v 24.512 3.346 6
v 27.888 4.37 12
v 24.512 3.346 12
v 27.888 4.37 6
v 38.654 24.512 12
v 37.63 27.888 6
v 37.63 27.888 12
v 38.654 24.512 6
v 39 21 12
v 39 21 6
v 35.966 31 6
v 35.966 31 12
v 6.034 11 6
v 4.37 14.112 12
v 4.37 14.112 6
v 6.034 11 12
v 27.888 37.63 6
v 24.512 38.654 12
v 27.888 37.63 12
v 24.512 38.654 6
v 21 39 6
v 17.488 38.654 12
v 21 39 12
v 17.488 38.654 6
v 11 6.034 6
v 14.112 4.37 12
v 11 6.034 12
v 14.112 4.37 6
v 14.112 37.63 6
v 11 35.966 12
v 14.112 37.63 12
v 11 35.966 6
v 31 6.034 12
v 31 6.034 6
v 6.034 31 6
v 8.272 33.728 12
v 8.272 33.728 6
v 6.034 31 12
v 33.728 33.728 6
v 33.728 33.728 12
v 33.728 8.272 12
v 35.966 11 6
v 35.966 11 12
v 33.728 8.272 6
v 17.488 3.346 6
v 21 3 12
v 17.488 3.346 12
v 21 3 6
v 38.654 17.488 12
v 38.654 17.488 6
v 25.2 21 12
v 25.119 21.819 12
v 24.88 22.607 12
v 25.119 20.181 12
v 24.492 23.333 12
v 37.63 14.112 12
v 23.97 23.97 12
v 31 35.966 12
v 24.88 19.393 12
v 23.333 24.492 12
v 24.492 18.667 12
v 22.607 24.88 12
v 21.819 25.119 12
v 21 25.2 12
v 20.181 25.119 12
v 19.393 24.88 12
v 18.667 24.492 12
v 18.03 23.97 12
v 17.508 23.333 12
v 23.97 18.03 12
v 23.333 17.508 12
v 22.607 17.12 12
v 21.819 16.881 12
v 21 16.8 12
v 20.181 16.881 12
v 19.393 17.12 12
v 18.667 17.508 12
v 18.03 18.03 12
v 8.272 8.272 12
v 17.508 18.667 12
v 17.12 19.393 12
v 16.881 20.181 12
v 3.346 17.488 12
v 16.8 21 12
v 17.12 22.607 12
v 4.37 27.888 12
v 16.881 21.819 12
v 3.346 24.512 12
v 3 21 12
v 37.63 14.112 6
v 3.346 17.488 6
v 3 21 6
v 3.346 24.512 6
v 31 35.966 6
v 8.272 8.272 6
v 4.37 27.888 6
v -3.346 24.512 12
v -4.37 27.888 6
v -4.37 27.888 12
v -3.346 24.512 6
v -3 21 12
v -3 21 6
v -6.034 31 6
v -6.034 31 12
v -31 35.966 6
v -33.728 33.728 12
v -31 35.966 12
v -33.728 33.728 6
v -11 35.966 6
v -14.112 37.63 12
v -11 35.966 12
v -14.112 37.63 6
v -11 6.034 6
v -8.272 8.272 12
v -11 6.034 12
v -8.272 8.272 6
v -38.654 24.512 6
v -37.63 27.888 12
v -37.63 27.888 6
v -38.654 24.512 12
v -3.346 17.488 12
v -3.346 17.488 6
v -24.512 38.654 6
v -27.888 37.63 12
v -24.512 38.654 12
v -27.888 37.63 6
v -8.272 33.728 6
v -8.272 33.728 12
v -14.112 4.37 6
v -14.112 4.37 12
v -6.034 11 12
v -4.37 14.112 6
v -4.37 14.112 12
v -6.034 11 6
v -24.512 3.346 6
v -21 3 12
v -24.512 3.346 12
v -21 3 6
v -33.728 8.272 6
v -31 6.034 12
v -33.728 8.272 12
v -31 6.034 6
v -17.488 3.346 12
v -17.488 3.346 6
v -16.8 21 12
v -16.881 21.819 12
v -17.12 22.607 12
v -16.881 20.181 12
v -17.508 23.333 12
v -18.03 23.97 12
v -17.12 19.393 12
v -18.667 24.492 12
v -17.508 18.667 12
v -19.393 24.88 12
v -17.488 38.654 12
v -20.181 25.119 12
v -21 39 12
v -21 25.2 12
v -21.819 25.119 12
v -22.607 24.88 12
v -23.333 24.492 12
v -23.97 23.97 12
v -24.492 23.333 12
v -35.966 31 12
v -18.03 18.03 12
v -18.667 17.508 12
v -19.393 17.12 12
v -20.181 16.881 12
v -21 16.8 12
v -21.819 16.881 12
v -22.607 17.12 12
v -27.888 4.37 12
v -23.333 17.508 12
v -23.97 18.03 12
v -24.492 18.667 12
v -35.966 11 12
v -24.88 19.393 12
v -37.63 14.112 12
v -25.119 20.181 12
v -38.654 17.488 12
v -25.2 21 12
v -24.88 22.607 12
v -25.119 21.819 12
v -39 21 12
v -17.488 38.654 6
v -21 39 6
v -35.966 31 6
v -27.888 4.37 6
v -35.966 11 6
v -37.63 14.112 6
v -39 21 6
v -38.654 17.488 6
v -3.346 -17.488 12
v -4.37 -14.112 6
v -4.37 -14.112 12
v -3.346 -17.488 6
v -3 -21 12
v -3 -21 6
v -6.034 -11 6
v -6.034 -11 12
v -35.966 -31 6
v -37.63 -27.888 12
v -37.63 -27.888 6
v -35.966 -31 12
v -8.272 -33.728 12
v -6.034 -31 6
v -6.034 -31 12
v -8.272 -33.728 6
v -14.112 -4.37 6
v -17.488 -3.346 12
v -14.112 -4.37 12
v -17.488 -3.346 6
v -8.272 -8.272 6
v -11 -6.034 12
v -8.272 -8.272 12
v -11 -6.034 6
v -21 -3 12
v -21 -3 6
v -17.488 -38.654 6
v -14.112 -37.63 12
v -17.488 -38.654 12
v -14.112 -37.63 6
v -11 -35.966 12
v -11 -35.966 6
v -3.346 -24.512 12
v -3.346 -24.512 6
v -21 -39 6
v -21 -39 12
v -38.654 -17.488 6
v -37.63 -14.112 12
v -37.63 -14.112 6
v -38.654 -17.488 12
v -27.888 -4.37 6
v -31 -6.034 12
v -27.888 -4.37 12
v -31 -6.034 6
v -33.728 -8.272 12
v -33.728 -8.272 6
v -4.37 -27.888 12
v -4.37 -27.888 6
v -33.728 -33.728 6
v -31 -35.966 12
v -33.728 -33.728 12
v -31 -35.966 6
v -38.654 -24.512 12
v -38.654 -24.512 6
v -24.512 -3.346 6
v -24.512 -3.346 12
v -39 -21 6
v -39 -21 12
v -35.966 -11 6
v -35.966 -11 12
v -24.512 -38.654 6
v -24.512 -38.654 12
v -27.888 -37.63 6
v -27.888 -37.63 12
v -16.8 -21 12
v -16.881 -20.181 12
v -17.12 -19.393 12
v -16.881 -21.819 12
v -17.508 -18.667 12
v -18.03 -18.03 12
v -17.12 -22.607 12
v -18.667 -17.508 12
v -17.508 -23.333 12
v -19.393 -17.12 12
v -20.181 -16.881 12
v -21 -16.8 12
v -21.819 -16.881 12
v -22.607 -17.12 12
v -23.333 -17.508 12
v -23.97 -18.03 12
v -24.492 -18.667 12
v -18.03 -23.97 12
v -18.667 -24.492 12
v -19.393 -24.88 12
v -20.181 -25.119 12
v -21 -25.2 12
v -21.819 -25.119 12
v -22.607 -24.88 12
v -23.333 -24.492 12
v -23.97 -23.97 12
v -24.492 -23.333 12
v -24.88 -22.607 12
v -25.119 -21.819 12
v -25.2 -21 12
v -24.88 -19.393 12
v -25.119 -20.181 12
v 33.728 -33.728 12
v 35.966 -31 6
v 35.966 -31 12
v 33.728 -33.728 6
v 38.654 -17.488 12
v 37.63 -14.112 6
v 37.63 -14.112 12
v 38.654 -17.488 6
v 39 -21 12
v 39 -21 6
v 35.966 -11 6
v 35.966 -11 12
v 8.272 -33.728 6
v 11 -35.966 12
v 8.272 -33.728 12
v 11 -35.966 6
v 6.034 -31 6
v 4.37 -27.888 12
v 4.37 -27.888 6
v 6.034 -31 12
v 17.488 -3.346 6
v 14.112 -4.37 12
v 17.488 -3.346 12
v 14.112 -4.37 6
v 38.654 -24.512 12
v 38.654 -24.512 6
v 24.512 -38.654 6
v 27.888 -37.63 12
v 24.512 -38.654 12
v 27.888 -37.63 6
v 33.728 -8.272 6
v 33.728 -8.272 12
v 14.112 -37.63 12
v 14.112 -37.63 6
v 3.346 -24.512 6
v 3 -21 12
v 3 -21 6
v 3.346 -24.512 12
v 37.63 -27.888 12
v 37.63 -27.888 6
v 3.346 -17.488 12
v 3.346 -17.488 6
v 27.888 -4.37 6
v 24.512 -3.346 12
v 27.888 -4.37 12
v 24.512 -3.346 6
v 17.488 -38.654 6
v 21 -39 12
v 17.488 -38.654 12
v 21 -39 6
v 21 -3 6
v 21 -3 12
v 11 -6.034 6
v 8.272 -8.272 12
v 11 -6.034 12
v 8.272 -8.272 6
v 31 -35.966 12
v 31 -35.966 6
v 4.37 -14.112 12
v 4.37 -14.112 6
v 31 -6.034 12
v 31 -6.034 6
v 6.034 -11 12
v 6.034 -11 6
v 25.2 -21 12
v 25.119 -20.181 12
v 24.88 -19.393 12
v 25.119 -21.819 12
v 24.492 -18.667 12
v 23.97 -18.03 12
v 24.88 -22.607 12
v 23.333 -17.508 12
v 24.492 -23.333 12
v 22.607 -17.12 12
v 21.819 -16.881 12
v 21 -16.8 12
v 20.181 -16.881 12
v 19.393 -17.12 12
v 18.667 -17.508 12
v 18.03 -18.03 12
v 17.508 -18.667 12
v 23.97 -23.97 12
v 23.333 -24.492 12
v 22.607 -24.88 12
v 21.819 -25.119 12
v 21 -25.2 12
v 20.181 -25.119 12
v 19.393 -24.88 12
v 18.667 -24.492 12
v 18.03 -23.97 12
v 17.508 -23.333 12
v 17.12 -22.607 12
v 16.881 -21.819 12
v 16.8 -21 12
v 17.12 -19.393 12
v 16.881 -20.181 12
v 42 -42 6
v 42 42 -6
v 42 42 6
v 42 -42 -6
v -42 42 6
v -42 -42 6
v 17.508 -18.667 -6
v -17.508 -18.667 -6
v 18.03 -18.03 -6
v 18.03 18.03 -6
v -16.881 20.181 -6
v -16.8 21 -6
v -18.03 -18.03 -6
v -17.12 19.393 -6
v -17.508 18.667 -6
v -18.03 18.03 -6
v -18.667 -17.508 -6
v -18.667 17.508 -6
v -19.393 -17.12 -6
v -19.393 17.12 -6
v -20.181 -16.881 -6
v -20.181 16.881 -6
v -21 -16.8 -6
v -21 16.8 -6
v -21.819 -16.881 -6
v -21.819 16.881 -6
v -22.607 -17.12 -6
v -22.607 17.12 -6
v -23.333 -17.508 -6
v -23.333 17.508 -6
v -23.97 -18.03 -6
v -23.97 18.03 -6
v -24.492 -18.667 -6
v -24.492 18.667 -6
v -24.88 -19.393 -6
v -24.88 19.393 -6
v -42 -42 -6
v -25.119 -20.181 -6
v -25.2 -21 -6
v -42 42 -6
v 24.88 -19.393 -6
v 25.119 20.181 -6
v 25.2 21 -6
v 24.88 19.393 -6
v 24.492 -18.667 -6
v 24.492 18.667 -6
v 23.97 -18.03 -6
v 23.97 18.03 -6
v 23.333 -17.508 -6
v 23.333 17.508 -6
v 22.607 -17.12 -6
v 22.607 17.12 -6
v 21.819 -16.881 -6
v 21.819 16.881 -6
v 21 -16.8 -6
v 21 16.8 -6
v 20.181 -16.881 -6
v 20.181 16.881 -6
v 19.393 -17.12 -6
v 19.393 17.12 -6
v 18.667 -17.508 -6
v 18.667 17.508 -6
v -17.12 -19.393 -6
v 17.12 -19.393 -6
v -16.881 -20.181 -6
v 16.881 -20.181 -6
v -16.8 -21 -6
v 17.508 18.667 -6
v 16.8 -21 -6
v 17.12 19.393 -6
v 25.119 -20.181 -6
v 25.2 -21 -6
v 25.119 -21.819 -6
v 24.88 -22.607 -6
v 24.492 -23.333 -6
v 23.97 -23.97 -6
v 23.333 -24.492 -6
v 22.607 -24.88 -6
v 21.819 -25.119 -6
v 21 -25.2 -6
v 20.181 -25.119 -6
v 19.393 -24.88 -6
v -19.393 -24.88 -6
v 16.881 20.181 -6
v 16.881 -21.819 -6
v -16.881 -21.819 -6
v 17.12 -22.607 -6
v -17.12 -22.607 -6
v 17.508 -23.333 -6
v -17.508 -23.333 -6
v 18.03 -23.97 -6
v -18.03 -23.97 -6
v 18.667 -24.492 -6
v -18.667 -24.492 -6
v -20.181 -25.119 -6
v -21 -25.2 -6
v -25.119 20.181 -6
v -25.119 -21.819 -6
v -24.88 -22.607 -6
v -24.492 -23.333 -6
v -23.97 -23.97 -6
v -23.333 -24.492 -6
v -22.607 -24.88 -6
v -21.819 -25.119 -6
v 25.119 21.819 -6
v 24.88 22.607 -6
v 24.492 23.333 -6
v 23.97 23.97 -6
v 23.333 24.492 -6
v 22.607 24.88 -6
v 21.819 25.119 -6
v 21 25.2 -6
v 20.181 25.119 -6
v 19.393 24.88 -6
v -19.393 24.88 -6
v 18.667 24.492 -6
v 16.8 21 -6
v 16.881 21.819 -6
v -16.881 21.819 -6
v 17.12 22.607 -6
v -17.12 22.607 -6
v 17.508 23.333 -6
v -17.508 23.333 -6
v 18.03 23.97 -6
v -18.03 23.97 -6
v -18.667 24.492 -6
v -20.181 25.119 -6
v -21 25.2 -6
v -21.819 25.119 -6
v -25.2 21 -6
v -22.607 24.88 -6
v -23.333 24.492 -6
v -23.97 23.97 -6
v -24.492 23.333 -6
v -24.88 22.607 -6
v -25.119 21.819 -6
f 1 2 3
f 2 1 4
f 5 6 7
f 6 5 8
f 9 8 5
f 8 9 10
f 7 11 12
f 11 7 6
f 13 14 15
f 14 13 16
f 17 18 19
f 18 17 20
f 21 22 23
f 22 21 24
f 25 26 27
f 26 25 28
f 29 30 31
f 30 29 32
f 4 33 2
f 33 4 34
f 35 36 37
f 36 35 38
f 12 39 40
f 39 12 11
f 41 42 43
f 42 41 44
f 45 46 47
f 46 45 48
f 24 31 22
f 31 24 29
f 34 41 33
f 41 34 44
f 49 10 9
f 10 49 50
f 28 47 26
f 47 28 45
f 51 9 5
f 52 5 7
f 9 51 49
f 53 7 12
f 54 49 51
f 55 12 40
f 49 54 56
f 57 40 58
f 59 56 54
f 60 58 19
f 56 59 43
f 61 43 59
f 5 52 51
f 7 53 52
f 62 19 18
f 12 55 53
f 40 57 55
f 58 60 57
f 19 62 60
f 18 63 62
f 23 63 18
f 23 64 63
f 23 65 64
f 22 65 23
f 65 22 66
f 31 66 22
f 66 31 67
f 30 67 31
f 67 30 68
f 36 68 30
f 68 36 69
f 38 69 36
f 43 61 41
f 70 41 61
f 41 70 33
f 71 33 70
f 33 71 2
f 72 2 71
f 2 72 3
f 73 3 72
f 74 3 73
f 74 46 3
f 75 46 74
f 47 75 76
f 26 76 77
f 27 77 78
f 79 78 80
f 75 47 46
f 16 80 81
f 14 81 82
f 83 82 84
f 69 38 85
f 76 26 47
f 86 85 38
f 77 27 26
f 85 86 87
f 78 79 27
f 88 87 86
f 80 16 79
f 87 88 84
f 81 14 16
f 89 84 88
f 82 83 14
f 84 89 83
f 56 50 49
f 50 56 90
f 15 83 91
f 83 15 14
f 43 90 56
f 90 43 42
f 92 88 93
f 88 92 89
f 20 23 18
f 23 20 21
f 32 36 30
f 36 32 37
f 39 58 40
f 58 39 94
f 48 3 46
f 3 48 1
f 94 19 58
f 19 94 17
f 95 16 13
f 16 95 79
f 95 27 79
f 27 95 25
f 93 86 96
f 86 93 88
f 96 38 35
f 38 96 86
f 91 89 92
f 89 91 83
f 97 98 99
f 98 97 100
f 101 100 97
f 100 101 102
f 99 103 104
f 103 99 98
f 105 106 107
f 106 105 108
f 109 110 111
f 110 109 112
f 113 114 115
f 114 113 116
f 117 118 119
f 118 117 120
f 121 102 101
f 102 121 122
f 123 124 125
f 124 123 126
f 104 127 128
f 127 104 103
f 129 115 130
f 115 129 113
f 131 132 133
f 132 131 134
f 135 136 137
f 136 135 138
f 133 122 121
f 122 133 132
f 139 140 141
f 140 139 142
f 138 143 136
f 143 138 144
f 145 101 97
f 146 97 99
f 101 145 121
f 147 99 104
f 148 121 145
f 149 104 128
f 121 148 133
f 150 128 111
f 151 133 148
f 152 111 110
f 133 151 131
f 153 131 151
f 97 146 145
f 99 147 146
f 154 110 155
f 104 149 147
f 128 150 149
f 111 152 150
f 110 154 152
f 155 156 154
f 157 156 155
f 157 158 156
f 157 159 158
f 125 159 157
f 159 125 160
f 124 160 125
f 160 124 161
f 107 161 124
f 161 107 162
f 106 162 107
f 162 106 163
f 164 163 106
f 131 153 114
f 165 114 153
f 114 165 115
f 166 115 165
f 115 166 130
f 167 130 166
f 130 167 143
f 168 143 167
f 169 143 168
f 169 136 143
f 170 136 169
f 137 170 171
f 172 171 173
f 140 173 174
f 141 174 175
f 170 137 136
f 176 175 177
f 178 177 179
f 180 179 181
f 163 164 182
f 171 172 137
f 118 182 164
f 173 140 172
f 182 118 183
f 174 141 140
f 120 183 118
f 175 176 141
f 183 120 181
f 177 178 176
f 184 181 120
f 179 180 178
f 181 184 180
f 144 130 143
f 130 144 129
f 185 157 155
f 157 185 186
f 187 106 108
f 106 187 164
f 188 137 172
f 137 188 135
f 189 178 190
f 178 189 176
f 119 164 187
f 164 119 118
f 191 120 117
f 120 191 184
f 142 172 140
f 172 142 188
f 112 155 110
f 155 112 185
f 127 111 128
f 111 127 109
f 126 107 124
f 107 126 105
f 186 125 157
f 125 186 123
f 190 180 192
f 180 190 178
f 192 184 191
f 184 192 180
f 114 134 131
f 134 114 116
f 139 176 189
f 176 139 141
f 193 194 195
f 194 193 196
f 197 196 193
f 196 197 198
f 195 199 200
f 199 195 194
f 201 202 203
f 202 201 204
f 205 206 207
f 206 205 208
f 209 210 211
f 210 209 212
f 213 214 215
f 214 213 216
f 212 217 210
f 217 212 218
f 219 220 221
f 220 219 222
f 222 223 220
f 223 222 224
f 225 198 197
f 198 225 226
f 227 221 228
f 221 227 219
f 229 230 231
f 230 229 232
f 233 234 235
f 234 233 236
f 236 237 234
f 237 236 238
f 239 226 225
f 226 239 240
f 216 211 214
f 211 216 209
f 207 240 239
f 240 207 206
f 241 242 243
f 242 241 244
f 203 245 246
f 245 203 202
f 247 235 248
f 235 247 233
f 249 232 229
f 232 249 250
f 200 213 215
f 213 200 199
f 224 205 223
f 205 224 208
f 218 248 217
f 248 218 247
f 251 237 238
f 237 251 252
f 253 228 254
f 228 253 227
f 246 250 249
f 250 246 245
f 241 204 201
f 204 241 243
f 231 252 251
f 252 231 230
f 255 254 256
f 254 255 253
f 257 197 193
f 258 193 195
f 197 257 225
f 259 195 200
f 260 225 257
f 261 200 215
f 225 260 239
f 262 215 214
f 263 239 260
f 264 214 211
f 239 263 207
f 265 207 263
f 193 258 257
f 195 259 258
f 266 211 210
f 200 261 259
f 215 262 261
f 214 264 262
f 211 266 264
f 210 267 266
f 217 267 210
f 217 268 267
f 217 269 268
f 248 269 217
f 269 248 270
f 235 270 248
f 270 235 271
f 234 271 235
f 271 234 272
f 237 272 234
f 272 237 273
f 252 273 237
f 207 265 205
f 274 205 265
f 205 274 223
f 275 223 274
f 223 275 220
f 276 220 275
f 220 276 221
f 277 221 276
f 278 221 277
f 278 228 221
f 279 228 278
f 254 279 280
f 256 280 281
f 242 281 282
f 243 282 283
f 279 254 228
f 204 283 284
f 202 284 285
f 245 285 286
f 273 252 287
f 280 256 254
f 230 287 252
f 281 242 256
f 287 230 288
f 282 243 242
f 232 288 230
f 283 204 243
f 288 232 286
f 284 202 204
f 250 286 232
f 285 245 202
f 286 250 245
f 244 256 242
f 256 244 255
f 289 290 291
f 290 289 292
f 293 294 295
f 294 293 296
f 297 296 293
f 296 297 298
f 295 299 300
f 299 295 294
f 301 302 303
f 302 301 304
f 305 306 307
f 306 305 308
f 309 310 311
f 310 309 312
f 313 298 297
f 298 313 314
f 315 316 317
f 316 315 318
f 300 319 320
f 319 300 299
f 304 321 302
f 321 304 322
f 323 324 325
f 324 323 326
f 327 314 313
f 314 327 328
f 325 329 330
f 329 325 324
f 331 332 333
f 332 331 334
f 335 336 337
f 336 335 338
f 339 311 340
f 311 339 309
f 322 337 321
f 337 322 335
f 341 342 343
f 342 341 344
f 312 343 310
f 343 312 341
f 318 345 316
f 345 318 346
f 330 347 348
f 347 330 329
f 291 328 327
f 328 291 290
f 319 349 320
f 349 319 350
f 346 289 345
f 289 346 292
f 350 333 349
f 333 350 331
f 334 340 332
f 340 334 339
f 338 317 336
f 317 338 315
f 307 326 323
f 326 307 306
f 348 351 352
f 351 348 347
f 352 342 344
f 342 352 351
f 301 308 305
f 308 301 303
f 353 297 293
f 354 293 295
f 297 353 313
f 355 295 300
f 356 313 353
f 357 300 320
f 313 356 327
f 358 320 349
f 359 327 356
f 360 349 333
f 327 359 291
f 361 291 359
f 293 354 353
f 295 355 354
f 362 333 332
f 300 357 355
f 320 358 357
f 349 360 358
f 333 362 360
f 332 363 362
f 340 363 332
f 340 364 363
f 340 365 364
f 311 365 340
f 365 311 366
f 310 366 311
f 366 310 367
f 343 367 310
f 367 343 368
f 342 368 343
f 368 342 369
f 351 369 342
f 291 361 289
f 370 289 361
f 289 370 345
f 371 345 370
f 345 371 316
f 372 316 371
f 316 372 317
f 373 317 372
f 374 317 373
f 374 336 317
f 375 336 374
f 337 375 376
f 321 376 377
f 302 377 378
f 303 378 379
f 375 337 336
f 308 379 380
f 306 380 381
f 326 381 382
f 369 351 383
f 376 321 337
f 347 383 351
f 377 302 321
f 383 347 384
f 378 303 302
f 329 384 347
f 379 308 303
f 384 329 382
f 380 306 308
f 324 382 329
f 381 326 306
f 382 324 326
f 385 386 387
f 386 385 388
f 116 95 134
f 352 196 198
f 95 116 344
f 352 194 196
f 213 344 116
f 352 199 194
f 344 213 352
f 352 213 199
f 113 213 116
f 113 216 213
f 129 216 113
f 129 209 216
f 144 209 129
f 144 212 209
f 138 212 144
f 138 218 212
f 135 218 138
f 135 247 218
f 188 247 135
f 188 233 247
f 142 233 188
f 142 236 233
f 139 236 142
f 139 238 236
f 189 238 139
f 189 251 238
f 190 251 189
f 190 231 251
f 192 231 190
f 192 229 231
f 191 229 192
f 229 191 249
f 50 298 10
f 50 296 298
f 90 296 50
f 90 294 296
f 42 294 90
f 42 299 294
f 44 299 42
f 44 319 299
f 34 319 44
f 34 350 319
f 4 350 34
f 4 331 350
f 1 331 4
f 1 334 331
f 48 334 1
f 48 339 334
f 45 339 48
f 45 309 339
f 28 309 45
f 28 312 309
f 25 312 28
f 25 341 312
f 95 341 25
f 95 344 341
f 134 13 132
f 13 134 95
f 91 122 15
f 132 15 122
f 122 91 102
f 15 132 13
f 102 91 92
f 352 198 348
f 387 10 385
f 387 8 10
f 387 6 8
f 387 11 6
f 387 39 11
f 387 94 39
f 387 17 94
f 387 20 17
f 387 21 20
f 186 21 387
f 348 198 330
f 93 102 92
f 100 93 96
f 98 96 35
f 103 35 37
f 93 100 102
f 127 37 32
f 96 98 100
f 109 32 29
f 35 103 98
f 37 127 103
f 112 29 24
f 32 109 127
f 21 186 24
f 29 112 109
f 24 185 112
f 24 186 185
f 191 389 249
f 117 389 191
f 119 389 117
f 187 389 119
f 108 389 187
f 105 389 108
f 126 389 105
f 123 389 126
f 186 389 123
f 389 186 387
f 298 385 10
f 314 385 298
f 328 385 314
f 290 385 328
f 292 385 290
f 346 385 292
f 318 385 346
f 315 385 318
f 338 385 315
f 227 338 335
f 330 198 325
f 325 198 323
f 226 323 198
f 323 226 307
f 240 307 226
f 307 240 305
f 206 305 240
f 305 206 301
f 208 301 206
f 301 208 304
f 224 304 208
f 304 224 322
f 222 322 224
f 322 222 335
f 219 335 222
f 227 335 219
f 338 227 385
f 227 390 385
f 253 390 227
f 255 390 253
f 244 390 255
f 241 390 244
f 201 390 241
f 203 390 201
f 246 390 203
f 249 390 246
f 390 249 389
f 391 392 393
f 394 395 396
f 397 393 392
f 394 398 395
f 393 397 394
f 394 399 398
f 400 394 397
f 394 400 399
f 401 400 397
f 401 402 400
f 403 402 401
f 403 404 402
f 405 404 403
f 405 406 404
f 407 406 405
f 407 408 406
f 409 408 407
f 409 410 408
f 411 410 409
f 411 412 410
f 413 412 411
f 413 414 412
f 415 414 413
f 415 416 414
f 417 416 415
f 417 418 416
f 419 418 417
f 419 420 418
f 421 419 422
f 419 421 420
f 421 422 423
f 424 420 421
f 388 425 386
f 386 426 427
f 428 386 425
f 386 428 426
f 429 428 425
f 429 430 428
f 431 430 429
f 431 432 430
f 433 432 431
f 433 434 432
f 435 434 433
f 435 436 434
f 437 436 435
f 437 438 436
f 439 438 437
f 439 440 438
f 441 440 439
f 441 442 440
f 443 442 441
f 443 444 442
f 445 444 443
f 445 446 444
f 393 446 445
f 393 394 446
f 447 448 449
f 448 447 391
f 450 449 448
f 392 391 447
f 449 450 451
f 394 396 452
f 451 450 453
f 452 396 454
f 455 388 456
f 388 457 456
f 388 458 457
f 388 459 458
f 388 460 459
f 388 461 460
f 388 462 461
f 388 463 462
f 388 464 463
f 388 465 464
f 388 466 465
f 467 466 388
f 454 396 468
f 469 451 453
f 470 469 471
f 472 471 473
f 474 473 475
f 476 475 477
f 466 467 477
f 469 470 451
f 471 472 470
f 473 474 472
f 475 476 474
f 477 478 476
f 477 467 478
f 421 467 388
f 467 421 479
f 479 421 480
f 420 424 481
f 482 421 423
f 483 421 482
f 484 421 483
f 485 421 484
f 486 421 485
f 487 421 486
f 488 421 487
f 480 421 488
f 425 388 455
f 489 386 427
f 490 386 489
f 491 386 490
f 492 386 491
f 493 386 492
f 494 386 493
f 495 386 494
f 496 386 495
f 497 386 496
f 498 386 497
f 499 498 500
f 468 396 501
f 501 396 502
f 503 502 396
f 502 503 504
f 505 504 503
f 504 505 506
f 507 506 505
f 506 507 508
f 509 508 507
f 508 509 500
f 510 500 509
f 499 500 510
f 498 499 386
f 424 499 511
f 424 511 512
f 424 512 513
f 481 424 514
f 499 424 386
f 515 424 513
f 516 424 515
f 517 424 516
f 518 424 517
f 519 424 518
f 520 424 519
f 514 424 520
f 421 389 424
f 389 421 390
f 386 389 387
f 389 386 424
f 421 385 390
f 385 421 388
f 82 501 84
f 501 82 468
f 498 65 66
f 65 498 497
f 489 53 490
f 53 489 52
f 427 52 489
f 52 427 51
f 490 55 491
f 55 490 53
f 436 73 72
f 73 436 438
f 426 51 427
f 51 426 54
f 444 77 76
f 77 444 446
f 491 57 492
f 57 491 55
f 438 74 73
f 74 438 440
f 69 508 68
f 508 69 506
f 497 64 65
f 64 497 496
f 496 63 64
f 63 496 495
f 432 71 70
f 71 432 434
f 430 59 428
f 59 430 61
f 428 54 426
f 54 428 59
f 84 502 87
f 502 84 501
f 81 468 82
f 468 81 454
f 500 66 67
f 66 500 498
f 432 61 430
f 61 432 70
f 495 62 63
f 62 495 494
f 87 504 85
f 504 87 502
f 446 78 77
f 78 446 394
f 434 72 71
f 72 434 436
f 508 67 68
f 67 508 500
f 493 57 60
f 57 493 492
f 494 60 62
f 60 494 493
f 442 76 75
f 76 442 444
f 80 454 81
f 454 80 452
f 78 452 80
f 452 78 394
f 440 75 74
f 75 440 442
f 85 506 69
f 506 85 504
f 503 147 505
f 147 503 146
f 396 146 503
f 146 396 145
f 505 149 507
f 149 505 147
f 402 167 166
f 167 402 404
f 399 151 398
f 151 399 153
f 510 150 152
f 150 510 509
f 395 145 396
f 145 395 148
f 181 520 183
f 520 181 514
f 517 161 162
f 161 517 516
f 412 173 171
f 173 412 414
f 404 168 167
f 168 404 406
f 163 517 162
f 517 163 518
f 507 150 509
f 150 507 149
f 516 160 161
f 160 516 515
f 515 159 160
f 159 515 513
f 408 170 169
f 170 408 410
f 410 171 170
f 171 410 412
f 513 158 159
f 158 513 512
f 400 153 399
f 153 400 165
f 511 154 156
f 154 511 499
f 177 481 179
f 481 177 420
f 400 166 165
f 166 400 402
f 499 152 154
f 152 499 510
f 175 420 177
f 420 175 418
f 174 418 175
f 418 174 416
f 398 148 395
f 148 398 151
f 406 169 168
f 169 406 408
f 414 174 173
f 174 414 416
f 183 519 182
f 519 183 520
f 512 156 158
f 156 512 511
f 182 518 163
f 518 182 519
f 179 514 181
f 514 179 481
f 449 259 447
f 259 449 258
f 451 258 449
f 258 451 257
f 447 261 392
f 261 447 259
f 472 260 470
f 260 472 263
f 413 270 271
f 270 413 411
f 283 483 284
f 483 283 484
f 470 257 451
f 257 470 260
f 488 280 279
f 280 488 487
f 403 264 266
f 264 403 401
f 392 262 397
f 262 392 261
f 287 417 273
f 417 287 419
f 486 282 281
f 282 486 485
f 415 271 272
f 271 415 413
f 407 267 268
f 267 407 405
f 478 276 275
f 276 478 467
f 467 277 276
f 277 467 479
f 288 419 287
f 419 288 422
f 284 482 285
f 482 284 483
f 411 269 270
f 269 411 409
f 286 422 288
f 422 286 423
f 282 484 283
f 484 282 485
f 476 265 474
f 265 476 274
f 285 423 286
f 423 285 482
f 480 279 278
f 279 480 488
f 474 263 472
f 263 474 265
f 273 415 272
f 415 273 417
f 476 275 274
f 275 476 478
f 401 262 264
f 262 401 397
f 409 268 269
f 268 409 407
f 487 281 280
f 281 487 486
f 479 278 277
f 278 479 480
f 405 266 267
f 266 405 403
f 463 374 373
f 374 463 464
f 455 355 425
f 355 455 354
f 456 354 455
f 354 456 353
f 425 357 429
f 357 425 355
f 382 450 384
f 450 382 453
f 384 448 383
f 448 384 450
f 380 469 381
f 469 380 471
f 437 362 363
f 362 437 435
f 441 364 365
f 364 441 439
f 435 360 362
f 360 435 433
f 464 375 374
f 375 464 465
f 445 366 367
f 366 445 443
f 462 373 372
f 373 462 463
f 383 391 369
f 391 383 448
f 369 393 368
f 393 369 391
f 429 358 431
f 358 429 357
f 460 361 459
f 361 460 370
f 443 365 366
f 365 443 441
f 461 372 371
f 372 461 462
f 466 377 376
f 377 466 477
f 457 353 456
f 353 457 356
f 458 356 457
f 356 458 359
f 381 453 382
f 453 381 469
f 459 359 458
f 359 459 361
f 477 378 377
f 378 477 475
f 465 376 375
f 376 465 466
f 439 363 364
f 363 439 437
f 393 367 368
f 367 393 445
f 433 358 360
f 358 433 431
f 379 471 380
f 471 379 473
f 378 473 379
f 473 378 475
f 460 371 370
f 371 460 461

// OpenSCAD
$fn = 32;

// ----------------------------------------------------------------------
// Anchor pads 84 x 84 x 18
// four corner bosses with anchor holes
// ----------------------------------------------------------------------

// --- parameters (mm) ---
plate = [84, 84, 12];  // base plate size (x, y, z)
pads = 4;              // boss count, one per corner
edge = 21;             // boss centre offset from the plate edge
boss_d = 36;           // boss diameter
boss_h = 6;            // boss height above the base plate
hole_d = 8.4;          // hole diameter

// --- derived feature positions (mm) ---
height = plate[2] + boss_h;      // = 18   overall height of the part
corner_x = plate[0] / 2 - edge;  // = 21   boss centre X
corner_y = plate[1] / 2 - edge;  // = 21   boss centre Y
feature_centers = [
  [corner_x, corner_y],
  [-corner_x, corner_y],
  [-corner_x, -corner_y],
  [corner_x, -corner_y]
];   // boss centres, anchor holes are drilled there

// base plate, four bosses standing on it, anchor holes all the way through
difference() {
  union() {
    cube(plate, center = true);
    for (centre = feature_centers)
      translate([centre[0], centre[1], plate[2] / 2 - 1])
        cylinder(d = boss_d, h = boss_h + 1);
  }
  for (centre = feature_centers)
    translate([centre[0], centre[1], -height])
      cylinder(d = hole_d, h = 2 * height + 2);  // through boss and plate
}
